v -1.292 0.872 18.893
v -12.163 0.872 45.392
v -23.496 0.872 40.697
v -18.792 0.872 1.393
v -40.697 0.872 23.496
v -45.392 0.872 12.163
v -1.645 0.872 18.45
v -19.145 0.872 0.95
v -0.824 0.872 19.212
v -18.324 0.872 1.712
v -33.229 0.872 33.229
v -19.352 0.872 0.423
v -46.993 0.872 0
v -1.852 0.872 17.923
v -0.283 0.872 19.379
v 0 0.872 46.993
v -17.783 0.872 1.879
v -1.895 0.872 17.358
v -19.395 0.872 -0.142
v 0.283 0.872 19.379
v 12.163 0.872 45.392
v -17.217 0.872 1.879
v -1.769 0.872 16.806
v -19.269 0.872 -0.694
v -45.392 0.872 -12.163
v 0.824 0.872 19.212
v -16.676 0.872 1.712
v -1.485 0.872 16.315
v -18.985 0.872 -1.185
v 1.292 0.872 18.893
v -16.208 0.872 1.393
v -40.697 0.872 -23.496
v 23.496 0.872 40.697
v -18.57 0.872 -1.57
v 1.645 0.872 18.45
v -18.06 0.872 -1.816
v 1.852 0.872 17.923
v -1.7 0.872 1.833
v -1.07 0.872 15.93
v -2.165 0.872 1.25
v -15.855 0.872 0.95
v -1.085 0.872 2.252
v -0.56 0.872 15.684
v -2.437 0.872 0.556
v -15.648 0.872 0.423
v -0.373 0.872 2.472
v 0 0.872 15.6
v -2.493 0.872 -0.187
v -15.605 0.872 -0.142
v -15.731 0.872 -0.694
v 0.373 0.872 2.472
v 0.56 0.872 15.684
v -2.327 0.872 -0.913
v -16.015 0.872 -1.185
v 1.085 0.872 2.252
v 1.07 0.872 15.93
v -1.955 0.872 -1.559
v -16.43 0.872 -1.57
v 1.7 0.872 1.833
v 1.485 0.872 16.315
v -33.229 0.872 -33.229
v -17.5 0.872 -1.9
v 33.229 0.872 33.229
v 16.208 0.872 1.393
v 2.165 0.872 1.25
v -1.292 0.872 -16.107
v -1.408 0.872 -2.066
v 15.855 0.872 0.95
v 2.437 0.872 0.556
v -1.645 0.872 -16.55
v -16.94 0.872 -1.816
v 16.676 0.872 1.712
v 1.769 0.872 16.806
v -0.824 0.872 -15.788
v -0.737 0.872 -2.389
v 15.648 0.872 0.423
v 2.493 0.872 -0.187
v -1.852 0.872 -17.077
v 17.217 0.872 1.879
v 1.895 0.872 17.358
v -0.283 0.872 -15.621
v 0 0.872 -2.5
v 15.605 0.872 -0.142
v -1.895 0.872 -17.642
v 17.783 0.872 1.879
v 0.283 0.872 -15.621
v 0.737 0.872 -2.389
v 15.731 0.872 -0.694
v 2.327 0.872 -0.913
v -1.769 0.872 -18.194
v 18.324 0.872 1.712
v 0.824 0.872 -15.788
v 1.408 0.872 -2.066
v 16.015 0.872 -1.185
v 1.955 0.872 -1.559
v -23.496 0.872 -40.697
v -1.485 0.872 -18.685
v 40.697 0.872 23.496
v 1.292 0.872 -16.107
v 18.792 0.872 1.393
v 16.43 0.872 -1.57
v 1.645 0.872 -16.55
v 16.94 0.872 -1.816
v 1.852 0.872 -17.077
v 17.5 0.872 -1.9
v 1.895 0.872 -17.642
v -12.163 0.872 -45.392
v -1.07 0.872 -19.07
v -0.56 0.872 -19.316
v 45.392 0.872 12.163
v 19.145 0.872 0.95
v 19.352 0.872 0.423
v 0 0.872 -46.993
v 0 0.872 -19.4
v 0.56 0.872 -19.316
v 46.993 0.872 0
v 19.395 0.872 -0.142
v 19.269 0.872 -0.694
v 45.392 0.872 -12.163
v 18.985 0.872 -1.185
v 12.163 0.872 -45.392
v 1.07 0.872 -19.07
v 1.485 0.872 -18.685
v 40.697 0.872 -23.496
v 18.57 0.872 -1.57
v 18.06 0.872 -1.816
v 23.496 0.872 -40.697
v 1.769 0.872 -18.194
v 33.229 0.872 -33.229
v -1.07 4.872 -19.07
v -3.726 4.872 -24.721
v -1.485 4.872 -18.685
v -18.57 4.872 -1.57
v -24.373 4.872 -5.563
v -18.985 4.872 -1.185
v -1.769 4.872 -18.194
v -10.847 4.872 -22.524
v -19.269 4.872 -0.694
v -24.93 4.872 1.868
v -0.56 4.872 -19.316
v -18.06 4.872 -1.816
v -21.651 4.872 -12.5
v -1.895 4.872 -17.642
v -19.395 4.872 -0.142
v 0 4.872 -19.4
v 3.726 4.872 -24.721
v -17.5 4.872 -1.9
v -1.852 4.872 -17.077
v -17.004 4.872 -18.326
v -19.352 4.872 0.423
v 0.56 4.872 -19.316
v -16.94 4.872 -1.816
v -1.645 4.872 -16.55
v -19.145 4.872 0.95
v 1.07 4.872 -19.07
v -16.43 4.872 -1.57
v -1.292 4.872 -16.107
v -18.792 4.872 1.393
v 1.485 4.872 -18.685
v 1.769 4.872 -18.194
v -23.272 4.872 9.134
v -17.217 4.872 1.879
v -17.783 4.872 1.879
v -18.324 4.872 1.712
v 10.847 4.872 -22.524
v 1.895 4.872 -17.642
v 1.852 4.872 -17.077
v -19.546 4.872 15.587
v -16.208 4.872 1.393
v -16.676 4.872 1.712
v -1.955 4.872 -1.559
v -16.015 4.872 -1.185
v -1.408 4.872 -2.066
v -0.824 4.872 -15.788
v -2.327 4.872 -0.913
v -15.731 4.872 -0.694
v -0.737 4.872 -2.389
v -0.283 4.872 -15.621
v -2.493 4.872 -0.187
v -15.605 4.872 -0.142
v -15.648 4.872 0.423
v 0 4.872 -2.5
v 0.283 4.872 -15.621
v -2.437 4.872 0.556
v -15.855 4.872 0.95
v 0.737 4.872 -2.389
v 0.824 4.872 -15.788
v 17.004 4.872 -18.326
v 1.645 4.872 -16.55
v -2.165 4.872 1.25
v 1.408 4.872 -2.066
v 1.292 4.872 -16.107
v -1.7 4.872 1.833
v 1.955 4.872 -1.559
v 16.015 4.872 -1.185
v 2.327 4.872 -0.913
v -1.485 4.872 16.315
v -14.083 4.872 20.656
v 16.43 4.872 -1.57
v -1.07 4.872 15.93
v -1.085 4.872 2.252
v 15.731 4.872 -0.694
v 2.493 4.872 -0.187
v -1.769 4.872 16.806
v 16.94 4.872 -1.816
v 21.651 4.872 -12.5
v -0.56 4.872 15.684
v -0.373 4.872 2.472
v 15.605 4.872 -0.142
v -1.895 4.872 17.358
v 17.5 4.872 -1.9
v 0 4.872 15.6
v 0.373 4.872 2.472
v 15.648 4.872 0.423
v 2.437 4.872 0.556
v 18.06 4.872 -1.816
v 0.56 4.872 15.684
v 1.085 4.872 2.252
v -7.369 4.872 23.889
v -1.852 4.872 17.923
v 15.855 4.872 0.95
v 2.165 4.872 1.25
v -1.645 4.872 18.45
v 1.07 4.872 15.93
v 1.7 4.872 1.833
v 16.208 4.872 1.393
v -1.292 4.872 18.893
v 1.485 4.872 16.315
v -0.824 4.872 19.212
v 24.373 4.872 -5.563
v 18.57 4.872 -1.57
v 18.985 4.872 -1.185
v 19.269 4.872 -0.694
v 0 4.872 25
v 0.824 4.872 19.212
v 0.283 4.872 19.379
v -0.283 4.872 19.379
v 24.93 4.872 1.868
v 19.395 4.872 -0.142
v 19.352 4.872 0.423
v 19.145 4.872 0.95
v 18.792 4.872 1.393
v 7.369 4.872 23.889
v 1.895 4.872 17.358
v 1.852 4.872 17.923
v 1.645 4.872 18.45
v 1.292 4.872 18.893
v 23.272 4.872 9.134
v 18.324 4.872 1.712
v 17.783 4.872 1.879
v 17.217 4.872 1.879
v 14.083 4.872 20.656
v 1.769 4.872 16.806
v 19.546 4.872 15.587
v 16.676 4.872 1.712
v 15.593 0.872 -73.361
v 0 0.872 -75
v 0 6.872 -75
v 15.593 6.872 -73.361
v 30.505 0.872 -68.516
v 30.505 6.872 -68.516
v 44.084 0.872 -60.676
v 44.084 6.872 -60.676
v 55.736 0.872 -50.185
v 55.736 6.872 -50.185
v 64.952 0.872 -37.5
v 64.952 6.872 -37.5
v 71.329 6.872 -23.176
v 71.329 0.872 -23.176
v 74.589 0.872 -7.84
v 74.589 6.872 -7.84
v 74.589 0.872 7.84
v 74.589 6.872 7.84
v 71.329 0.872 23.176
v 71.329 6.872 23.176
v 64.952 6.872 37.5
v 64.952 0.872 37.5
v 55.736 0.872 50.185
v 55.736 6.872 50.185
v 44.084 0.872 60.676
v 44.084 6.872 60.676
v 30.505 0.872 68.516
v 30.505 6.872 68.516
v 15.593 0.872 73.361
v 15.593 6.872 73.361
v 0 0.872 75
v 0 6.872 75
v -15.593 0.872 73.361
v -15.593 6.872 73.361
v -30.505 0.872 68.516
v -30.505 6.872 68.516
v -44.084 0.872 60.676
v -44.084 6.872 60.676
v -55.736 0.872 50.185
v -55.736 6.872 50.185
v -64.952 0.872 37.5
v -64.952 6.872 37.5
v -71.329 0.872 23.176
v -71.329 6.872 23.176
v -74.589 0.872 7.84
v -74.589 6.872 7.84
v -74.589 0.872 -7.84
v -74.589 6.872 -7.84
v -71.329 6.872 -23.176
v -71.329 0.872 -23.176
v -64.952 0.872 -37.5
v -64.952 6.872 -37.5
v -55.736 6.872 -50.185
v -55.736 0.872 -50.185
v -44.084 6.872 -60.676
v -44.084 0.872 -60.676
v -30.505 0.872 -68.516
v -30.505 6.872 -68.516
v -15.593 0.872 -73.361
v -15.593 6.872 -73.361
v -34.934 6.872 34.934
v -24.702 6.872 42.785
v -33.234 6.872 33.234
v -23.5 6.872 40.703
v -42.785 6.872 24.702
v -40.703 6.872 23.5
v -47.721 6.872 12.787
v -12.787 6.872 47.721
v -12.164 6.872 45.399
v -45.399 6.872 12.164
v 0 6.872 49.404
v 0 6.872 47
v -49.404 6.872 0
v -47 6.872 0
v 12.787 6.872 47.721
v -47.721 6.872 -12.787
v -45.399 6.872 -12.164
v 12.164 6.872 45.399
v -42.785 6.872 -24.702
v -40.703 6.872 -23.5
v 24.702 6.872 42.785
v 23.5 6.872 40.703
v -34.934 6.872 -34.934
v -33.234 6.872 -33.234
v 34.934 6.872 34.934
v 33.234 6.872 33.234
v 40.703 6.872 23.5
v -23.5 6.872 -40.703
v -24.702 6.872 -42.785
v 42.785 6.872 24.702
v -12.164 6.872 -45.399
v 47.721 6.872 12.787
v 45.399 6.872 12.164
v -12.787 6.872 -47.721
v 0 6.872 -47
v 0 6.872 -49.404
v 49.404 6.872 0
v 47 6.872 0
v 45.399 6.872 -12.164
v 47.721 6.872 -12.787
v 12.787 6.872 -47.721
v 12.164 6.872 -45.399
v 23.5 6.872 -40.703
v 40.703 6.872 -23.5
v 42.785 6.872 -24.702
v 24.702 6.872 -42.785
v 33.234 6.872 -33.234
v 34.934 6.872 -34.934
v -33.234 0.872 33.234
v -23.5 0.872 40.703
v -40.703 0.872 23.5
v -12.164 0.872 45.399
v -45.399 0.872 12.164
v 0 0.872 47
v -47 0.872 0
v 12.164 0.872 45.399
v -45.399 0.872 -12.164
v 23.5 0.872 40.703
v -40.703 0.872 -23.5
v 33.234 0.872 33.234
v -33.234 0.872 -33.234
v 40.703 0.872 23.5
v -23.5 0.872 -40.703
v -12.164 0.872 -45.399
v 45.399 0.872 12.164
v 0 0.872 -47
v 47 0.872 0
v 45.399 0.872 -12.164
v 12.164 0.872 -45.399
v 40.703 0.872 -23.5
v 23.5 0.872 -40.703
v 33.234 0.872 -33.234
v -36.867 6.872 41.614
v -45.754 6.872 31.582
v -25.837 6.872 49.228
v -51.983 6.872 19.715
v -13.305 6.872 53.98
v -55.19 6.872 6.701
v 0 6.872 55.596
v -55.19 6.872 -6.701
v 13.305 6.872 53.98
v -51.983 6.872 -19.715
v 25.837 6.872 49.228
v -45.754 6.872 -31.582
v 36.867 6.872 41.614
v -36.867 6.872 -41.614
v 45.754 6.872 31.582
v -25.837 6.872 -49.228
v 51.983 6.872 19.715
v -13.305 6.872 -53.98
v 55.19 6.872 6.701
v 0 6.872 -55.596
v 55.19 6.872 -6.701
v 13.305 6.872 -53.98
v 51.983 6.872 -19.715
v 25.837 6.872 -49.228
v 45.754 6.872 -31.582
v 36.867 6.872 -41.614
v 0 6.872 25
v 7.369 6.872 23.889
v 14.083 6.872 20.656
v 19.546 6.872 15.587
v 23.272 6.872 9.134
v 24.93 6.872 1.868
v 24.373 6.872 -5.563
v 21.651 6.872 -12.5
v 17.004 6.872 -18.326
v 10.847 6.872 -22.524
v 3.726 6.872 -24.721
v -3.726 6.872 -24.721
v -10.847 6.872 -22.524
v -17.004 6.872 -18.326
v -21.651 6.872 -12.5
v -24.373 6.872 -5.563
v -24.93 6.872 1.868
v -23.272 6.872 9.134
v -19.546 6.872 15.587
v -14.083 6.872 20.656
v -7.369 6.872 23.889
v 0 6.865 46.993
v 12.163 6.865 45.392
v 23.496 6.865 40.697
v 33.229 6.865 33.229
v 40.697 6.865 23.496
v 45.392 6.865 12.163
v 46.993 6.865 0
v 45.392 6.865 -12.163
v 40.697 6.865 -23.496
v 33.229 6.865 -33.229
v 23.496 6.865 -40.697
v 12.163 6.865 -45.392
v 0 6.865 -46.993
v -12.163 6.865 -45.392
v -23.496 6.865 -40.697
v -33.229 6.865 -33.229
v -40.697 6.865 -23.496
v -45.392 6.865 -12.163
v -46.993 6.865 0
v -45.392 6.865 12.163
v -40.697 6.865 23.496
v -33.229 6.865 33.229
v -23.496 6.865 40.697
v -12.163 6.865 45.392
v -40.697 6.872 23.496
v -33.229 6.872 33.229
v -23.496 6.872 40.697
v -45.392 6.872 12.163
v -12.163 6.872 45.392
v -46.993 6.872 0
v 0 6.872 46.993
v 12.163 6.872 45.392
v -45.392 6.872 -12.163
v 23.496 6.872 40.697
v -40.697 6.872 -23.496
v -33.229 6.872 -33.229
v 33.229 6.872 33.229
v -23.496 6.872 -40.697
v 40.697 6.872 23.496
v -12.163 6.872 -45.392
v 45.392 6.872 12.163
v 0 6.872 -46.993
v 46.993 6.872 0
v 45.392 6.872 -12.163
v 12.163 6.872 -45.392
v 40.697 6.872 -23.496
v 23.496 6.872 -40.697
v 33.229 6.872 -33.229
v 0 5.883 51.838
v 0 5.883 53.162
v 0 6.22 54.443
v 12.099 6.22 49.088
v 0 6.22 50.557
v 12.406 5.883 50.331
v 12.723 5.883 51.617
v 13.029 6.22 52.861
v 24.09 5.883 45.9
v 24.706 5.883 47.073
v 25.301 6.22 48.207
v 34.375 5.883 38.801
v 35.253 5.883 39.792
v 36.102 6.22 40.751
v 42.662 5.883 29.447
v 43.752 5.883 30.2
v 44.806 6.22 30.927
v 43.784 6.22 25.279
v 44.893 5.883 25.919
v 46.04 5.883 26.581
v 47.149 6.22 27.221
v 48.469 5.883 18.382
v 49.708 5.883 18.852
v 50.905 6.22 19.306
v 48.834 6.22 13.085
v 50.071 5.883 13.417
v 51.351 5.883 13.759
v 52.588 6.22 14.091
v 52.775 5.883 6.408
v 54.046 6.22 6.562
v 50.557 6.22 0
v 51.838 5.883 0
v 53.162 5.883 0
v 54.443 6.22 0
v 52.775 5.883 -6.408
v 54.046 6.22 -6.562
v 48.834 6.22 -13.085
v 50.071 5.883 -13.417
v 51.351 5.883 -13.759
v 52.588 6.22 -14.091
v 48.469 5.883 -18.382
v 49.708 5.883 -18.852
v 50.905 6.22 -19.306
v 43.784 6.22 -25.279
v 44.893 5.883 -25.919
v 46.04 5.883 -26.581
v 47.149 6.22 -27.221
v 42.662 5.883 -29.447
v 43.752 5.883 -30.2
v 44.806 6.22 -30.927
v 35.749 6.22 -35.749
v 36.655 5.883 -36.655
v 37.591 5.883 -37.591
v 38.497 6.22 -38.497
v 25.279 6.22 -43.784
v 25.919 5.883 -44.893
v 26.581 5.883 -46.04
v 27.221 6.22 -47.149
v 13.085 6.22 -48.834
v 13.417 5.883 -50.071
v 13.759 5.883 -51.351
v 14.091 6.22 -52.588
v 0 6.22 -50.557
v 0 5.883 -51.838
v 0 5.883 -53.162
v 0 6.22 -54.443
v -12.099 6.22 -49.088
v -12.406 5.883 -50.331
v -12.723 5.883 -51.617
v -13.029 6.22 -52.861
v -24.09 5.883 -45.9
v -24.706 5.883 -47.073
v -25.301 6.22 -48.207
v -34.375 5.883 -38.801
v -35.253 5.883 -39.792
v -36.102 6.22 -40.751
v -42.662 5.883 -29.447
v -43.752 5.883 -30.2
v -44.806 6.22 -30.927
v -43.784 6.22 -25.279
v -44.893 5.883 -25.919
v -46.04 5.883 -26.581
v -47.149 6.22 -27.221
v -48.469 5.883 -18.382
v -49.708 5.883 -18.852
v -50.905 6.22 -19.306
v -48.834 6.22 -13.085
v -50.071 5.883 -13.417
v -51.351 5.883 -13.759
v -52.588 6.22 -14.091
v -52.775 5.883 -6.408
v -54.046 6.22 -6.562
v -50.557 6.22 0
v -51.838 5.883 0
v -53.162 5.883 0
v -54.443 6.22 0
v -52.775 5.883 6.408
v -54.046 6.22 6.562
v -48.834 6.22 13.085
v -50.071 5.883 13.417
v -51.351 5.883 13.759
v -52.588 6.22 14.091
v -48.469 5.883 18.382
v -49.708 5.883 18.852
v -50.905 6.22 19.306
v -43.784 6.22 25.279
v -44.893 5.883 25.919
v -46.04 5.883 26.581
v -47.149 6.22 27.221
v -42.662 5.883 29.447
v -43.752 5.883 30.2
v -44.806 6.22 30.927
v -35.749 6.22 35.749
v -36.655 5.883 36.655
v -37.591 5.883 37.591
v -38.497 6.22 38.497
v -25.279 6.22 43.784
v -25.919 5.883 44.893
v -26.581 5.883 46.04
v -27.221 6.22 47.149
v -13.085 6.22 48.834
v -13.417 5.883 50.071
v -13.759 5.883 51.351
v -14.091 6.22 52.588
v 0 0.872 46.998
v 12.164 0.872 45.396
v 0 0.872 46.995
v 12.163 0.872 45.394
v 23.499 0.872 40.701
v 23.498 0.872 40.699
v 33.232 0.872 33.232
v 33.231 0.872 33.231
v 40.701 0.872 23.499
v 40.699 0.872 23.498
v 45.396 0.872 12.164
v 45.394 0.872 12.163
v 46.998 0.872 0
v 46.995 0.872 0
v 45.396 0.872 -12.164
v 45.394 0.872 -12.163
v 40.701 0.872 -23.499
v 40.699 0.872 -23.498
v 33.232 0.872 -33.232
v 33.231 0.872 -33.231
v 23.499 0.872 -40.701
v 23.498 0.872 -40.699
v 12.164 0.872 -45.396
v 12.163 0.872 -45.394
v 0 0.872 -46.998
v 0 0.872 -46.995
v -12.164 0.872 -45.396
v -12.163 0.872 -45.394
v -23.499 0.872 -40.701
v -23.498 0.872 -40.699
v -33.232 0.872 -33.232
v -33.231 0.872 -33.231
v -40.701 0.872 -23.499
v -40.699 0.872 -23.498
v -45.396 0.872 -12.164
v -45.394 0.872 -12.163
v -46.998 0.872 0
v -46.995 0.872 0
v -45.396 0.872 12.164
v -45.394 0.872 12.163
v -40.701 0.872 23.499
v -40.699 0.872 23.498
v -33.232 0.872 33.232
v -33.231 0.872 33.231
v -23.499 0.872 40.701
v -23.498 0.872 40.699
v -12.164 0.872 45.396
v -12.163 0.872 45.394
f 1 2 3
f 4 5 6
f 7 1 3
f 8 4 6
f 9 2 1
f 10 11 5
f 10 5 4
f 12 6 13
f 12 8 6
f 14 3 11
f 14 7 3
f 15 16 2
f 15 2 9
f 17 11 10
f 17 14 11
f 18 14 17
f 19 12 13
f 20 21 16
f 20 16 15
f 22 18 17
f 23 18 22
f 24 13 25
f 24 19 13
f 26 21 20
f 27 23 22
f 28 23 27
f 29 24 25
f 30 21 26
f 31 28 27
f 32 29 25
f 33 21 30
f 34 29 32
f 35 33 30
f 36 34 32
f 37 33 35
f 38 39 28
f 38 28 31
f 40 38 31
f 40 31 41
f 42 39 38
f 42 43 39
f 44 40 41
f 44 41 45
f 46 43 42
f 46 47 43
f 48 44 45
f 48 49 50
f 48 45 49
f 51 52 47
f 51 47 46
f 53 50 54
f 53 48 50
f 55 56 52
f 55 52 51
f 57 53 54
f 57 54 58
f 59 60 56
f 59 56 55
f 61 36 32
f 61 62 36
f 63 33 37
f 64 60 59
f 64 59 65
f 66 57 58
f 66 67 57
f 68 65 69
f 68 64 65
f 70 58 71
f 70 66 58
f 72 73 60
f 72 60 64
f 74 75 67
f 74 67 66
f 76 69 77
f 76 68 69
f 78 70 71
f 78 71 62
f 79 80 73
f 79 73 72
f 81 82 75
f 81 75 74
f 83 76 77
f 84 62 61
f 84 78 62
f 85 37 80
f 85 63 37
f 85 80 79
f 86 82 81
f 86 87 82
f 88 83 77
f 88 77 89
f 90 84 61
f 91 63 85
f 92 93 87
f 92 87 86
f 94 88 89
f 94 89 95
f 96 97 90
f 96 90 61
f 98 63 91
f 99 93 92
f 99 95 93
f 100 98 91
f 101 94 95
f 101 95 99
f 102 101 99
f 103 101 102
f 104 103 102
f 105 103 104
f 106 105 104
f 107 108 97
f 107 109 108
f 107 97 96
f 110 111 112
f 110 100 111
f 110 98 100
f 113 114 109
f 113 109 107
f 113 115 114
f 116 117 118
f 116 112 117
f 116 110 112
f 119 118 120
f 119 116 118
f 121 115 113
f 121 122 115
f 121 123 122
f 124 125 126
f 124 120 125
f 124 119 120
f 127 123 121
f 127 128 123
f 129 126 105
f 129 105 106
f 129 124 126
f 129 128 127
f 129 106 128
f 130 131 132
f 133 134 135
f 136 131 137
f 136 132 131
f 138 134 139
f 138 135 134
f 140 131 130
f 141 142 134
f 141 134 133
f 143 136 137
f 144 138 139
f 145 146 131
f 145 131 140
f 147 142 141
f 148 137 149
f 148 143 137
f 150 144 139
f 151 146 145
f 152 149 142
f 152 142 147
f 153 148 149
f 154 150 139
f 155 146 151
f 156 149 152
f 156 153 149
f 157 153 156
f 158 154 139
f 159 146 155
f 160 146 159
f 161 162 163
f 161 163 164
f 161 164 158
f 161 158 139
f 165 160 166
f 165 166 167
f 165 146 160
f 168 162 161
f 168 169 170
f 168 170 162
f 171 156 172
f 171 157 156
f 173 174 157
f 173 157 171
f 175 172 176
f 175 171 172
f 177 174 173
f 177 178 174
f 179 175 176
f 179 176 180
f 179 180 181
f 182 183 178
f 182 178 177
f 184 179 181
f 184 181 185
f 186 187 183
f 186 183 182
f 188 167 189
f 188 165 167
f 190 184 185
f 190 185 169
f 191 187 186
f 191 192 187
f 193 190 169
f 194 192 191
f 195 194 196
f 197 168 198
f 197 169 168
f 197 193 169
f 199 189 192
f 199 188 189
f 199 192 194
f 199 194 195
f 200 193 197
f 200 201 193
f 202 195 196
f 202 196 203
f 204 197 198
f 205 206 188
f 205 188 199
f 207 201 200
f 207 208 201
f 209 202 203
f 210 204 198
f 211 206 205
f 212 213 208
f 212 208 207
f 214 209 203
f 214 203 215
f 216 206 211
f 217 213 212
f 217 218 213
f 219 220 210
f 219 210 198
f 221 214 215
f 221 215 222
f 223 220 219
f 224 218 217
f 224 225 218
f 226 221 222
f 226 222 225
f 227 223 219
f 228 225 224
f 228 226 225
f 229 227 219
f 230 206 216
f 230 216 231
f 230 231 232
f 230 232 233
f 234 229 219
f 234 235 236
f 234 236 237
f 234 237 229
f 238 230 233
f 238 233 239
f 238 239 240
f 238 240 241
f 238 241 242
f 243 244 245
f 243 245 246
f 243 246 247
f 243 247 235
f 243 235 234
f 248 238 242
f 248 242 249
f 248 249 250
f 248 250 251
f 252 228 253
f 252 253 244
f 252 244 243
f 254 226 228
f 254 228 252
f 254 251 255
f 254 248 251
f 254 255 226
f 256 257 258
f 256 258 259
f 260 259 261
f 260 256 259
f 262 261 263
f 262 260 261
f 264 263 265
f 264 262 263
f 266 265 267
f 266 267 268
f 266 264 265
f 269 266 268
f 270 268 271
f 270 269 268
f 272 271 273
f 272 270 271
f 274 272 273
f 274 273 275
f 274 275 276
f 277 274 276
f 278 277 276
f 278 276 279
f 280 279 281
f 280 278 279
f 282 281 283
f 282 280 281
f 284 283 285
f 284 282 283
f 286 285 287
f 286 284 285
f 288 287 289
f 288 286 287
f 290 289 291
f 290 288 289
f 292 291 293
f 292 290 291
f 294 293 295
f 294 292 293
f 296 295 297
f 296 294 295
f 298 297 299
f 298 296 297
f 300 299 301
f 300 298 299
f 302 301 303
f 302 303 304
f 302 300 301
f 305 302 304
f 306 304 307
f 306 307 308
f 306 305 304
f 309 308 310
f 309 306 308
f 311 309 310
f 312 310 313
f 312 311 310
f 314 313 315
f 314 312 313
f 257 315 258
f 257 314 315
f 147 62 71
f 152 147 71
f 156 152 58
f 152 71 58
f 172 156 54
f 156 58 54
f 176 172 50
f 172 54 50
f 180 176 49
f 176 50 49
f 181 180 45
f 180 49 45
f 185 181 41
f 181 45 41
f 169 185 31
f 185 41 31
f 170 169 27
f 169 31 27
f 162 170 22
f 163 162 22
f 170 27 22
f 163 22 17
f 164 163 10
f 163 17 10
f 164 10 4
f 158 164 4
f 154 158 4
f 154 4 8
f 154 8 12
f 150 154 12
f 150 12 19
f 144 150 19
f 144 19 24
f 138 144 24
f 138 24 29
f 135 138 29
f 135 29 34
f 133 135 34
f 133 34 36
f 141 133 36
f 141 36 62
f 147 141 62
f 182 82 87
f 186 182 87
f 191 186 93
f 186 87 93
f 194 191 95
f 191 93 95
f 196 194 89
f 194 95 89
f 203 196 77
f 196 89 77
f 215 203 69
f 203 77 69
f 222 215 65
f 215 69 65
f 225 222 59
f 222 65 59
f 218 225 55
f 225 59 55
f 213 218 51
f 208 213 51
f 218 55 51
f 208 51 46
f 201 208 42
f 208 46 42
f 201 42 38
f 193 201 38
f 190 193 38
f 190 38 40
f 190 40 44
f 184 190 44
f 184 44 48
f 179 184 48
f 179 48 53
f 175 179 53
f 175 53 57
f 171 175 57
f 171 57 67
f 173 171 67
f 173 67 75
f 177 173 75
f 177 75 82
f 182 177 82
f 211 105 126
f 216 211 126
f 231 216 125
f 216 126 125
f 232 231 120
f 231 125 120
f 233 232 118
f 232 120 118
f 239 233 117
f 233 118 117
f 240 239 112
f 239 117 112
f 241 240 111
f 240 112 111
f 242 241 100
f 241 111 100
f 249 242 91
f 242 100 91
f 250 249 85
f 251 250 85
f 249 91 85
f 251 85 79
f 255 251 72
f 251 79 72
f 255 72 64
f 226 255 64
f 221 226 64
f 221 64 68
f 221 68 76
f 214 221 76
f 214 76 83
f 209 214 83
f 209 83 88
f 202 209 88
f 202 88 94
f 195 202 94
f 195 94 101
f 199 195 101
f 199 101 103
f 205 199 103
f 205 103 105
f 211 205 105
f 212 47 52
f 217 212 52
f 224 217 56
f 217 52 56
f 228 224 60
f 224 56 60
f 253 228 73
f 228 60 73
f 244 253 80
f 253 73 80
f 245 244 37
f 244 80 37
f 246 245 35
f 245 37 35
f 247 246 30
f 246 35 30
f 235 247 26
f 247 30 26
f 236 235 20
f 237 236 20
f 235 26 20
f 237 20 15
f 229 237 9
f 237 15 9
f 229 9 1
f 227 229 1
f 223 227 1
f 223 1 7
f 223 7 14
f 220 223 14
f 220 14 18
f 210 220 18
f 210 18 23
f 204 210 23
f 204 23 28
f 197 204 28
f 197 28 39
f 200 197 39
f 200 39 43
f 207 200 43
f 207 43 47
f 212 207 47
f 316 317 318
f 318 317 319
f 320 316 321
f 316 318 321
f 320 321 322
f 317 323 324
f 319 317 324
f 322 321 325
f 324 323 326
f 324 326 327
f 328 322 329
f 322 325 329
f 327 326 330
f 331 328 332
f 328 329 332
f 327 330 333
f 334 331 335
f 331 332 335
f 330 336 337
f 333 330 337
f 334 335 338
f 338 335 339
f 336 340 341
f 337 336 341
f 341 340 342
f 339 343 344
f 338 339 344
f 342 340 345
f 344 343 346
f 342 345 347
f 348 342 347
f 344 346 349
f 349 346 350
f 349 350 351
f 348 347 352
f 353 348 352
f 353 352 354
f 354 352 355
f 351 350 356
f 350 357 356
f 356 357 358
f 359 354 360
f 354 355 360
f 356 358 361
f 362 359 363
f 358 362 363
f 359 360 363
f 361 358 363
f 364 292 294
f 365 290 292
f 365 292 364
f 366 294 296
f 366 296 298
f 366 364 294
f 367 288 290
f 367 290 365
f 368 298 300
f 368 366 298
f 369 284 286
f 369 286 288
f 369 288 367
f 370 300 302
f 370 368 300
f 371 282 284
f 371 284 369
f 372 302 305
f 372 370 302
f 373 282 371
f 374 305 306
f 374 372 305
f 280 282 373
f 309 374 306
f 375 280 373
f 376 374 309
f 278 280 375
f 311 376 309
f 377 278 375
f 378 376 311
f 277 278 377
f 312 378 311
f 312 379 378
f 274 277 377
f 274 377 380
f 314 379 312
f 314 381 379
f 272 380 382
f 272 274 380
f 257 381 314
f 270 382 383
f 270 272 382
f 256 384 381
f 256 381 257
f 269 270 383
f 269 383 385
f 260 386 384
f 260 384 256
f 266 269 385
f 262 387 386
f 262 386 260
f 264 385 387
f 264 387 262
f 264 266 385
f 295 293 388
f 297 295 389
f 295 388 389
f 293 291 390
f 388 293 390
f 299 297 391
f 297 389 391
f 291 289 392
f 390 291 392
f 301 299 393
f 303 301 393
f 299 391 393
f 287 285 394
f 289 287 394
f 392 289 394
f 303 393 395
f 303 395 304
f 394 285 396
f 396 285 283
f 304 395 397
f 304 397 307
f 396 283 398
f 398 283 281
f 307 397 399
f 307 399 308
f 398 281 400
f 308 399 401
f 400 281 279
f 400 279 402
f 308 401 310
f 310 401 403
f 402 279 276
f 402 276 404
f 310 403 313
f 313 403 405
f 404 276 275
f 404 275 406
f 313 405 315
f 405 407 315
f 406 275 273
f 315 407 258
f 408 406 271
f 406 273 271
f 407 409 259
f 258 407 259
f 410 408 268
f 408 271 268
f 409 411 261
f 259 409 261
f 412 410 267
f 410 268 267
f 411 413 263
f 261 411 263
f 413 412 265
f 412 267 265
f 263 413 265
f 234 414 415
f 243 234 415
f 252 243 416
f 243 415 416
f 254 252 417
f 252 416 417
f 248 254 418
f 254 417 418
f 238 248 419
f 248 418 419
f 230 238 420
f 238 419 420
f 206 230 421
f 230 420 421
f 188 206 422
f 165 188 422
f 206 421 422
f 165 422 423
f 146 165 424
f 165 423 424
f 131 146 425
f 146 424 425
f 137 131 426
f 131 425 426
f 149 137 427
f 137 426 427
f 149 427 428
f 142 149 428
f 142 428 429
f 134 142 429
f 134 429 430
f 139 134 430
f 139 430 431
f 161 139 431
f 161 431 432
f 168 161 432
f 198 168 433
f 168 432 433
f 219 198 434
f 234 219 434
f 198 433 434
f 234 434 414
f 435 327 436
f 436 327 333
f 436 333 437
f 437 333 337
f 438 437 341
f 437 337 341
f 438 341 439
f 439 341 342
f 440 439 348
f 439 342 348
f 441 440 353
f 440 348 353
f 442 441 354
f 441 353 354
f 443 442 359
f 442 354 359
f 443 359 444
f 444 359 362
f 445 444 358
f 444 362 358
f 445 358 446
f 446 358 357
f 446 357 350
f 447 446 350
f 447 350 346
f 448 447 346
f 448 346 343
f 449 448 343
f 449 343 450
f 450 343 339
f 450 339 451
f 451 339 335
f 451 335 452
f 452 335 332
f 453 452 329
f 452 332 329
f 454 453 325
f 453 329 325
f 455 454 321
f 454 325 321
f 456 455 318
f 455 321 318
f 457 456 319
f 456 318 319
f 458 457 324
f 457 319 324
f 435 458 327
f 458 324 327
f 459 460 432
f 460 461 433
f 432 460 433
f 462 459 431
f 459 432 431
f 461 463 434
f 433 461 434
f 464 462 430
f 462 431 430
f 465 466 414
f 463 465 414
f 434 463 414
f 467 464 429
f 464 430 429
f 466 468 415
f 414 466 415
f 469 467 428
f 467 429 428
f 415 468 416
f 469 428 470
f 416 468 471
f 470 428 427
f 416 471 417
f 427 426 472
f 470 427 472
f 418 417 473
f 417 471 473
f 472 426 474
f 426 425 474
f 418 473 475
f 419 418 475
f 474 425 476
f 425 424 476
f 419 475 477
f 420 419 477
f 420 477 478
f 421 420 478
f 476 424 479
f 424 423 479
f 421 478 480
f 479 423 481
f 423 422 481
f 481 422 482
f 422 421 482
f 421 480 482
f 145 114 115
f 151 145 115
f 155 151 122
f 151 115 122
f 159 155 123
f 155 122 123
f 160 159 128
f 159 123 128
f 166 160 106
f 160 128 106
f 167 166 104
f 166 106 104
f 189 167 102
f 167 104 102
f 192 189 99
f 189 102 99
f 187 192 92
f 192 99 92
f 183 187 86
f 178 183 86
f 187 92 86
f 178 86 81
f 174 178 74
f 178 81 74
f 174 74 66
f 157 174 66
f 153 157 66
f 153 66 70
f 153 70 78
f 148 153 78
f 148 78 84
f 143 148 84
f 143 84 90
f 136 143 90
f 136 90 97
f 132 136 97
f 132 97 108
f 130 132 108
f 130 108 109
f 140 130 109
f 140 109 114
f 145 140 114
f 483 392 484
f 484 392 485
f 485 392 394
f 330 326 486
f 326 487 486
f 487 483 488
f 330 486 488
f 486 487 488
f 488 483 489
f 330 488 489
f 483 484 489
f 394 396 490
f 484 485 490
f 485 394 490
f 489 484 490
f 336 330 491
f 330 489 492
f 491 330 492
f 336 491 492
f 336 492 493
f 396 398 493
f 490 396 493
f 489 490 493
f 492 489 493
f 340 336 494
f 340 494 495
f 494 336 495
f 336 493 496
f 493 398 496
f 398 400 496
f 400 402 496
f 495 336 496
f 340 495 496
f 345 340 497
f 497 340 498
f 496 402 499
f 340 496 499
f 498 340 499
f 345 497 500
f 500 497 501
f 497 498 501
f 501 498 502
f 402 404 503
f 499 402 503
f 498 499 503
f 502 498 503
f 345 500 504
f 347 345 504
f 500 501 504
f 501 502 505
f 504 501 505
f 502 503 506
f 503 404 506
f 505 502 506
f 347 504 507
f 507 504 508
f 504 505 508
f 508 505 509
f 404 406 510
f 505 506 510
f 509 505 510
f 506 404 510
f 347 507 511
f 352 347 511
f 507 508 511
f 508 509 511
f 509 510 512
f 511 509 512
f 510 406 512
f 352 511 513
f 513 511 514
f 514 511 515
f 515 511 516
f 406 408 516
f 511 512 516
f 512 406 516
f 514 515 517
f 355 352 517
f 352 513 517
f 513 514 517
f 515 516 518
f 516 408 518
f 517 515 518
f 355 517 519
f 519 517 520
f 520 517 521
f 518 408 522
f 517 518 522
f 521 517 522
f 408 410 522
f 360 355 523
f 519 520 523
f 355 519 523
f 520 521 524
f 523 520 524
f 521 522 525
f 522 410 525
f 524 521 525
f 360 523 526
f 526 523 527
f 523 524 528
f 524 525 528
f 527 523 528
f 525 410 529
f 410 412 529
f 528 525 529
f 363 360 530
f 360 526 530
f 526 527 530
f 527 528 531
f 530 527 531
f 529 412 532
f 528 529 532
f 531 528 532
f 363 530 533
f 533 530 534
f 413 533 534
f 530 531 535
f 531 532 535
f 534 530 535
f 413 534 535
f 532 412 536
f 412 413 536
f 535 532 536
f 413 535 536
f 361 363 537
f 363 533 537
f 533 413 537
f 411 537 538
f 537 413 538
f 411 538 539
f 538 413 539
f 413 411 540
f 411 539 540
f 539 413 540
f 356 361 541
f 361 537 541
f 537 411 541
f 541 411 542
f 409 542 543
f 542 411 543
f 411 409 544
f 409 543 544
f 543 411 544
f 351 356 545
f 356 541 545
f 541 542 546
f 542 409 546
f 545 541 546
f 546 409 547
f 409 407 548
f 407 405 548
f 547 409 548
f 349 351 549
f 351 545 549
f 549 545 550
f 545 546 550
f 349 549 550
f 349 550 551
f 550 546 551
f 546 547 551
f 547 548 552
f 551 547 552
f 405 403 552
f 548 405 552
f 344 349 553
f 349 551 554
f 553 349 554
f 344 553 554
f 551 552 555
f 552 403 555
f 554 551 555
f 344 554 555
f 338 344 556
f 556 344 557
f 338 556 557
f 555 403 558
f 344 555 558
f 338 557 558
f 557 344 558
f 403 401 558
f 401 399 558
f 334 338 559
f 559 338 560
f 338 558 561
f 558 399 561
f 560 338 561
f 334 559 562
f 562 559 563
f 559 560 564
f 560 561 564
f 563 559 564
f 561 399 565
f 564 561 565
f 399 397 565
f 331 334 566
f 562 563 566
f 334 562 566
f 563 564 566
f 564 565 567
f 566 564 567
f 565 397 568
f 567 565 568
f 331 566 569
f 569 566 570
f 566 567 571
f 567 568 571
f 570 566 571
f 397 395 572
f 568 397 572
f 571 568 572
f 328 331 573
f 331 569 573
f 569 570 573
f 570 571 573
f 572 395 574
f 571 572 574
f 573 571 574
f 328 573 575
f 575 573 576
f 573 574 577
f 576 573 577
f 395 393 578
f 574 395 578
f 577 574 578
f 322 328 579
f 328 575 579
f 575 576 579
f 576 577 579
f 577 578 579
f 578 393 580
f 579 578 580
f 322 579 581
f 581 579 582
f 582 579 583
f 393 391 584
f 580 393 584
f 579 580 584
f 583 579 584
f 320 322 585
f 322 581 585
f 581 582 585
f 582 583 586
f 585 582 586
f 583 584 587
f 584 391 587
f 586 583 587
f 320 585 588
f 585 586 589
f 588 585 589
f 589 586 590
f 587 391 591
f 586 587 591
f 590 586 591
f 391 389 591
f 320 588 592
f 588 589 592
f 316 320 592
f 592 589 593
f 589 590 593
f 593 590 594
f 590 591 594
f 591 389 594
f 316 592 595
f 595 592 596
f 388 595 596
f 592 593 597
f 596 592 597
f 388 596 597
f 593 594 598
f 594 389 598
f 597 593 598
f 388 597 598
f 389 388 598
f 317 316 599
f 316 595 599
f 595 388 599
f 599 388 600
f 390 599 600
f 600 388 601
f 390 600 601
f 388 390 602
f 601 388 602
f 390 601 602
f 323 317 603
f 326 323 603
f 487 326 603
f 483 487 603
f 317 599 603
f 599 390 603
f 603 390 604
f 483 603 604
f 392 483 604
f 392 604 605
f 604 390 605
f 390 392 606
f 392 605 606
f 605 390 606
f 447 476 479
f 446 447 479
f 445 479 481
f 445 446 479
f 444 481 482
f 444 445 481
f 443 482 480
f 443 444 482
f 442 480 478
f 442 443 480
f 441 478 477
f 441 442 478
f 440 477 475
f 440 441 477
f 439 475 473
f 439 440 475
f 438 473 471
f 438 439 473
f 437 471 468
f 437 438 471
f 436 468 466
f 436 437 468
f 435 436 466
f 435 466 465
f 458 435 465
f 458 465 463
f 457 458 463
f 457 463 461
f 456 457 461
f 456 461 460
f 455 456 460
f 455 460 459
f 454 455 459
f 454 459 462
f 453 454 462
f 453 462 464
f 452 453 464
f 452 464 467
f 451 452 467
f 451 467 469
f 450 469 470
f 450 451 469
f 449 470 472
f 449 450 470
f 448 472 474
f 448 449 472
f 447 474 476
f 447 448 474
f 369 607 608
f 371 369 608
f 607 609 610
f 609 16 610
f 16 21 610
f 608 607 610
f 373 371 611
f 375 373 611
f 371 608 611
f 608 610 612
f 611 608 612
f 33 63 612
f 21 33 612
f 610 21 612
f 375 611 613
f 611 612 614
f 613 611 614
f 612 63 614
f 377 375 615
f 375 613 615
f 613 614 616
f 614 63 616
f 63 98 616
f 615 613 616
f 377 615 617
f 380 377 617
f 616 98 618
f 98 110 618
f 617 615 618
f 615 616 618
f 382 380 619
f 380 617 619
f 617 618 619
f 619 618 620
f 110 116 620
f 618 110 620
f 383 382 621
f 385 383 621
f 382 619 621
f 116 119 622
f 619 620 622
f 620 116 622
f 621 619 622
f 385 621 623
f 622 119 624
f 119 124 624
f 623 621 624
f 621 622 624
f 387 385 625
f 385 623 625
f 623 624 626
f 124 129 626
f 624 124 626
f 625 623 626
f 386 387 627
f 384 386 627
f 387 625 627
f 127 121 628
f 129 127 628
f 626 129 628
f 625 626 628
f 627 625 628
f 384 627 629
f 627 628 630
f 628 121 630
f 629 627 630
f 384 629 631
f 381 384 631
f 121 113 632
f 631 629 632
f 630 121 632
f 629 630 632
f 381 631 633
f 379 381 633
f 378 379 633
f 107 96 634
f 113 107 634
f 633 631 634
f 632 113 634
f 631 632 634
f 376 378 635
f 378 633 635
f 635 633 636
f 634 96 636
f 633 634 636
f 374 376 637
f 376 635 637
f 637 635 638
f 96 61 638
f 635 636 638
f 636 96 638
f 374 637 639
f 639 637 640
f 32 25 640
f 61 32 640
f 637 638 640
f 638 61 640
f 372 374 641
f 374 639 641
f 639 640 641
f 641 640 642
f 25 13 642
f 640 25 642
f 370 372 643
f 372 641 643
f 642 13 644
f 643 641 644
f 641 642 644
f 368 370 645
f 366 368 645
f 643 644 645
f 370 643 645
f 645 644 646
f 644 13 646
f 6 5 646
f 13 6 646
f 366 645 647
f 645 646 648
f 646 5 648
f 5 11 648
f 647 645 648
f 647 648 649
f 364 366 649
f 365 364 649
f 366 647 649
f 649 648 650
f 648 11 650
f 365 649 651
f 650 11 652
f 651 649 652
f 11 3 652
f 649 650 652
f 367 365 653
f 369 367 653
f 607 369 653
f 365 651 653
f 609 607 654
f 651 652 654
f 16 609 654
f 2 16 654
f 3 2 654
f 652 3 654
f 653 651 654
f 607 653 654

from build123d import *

# Parameters (mm, degrees)
SKETCH2_R           = 75
SKETCH2_R_2         = 59
SKETCH2_R_3         = 46.992946112
BOSS_EXTRUDE1_DEPTH = 6
SKETCH4_R           = 2.5
CUT_EXTRUDE1_DEPTH  = 8
SKETCH5_R           = 1.9
CUT_EXTRUDE2_DEPTH  = 8
SKETCH8_R           = 25
CUT_EXTRUDE4_DEPTH  = 2


with BuildPart() as part:
    # Sketch1 → Revolve1 (revolve)
    with BuildSketch(Plane(origin=(0, 0, 0), x_dir=(-1, 0, 0), z_dir=(0, 0, -1)), mode=Mode.PRIVATE) as revolve1_sk:
        with BuildLine():
            Line((-59, 0.8724), (-47, 0.8724))
            ThreePointArc((-47, 0.8724), (-46.292893219, 1.165293219), (-46, 1.8724))
            Line((-46, 1.8724), (-46, 5.8724))
            Line((-46, 5.8724), (-47, 6.8724))
            Line((-47, 6.8724), (-49.4043, 6.8724))
            ThreePointArc((-49.4043, 6.8724), (-52.5, 5.8405), (-55.5957, 6.8724))
            Line((-55.5957, 6.8724), (-59, 6.8724))
            Line((-59, 6.8724), (-60, 5.8724))
            Line((-60, 5.8724), (-60, 1.8724))
            ThreePointArc((-60, 1.8724), (-59.707106781, 1.165293219), (-59, 0.8724))
        make_face()
    revolve(revolve1_sk.sketch.rotate(Axis((0, 0, 0), (0, 1, 0)), 270), axis=Axis((0, 0, 0), (0, 1, 0)))

    # Sketch2 → Boss-Extrude1 (add)
    # profile 1 of 2: a face of its own
    with BuildSketch(Plane.XZ.offset(-0.8724)):
        with Locations(Location((0, 0, 0), (0, 0, 270))):
            Circle(SKETCH2_R)
        Circle(SKETCH2_R_2, mode=Mode.SUBTRACT)
    # profile 2 of 2: a face of its own
    with BuildSketch(Plane.XZ.offset(-0.8724)):
        with Locations(Location((0, 0, 0), (0, 0, 270))):
            Circle(SKETCH2_R_3)
    extrude(amount=-BOSS_EXTRUDE1_DEPTH)

    # Sketch4 → Cut-Extrude1 (cut)
    with BuildSketch(Plane.XZ.offset(-0.8724)):
        with Locations(Location((0, 0, 0), (0, 0, 270))):
            Circle(SKETCH4_R)
    extrude(amount=-CUT_EXTRUDE1_DEPTH, mode=Mode.SUBTRACT)

    # Sketch5 → Cut-Extrude2 (cut)
    with BuildSketch(Plane.XZ.offset(-0.8724)):
        with Locations(Location((0, 17.5, 0), (0, 0, 270))):
            Circle(SKETCH5_R)
        with Locations(Location((17.5, 0, 0), (0, 0, 270))):
            Circle(SKETCH5_R)
        with Locations(Location((0, -17.5, 0), (0, 0, 270))):
            Circle(SKETCH5_R)
        with Locations(Location((-17.5, 0, 0), (0, 0, 270))):
            Circle(SKETCH5_R)
    extrude(amount=-CUT_EXTRUDE2_DEPTH, mode=Mode.SUBTRACT)

    # Sketch8 → Cut-Extrude4 (cut)
    with BuildSketch(Plane(origin=(0, 6.8724, 0), x_dir=(1, 0, 0), z_dir=(0, 1, 0))):
        with Locations(Location((0, 0, 0), (0, 0, 270))):
            Circle(SKETCH8_R)
    extrude(amount=-CUT_EXTRUDE4_DEPTH, mode=Mode.SUBTRACT)


solid = part.part
